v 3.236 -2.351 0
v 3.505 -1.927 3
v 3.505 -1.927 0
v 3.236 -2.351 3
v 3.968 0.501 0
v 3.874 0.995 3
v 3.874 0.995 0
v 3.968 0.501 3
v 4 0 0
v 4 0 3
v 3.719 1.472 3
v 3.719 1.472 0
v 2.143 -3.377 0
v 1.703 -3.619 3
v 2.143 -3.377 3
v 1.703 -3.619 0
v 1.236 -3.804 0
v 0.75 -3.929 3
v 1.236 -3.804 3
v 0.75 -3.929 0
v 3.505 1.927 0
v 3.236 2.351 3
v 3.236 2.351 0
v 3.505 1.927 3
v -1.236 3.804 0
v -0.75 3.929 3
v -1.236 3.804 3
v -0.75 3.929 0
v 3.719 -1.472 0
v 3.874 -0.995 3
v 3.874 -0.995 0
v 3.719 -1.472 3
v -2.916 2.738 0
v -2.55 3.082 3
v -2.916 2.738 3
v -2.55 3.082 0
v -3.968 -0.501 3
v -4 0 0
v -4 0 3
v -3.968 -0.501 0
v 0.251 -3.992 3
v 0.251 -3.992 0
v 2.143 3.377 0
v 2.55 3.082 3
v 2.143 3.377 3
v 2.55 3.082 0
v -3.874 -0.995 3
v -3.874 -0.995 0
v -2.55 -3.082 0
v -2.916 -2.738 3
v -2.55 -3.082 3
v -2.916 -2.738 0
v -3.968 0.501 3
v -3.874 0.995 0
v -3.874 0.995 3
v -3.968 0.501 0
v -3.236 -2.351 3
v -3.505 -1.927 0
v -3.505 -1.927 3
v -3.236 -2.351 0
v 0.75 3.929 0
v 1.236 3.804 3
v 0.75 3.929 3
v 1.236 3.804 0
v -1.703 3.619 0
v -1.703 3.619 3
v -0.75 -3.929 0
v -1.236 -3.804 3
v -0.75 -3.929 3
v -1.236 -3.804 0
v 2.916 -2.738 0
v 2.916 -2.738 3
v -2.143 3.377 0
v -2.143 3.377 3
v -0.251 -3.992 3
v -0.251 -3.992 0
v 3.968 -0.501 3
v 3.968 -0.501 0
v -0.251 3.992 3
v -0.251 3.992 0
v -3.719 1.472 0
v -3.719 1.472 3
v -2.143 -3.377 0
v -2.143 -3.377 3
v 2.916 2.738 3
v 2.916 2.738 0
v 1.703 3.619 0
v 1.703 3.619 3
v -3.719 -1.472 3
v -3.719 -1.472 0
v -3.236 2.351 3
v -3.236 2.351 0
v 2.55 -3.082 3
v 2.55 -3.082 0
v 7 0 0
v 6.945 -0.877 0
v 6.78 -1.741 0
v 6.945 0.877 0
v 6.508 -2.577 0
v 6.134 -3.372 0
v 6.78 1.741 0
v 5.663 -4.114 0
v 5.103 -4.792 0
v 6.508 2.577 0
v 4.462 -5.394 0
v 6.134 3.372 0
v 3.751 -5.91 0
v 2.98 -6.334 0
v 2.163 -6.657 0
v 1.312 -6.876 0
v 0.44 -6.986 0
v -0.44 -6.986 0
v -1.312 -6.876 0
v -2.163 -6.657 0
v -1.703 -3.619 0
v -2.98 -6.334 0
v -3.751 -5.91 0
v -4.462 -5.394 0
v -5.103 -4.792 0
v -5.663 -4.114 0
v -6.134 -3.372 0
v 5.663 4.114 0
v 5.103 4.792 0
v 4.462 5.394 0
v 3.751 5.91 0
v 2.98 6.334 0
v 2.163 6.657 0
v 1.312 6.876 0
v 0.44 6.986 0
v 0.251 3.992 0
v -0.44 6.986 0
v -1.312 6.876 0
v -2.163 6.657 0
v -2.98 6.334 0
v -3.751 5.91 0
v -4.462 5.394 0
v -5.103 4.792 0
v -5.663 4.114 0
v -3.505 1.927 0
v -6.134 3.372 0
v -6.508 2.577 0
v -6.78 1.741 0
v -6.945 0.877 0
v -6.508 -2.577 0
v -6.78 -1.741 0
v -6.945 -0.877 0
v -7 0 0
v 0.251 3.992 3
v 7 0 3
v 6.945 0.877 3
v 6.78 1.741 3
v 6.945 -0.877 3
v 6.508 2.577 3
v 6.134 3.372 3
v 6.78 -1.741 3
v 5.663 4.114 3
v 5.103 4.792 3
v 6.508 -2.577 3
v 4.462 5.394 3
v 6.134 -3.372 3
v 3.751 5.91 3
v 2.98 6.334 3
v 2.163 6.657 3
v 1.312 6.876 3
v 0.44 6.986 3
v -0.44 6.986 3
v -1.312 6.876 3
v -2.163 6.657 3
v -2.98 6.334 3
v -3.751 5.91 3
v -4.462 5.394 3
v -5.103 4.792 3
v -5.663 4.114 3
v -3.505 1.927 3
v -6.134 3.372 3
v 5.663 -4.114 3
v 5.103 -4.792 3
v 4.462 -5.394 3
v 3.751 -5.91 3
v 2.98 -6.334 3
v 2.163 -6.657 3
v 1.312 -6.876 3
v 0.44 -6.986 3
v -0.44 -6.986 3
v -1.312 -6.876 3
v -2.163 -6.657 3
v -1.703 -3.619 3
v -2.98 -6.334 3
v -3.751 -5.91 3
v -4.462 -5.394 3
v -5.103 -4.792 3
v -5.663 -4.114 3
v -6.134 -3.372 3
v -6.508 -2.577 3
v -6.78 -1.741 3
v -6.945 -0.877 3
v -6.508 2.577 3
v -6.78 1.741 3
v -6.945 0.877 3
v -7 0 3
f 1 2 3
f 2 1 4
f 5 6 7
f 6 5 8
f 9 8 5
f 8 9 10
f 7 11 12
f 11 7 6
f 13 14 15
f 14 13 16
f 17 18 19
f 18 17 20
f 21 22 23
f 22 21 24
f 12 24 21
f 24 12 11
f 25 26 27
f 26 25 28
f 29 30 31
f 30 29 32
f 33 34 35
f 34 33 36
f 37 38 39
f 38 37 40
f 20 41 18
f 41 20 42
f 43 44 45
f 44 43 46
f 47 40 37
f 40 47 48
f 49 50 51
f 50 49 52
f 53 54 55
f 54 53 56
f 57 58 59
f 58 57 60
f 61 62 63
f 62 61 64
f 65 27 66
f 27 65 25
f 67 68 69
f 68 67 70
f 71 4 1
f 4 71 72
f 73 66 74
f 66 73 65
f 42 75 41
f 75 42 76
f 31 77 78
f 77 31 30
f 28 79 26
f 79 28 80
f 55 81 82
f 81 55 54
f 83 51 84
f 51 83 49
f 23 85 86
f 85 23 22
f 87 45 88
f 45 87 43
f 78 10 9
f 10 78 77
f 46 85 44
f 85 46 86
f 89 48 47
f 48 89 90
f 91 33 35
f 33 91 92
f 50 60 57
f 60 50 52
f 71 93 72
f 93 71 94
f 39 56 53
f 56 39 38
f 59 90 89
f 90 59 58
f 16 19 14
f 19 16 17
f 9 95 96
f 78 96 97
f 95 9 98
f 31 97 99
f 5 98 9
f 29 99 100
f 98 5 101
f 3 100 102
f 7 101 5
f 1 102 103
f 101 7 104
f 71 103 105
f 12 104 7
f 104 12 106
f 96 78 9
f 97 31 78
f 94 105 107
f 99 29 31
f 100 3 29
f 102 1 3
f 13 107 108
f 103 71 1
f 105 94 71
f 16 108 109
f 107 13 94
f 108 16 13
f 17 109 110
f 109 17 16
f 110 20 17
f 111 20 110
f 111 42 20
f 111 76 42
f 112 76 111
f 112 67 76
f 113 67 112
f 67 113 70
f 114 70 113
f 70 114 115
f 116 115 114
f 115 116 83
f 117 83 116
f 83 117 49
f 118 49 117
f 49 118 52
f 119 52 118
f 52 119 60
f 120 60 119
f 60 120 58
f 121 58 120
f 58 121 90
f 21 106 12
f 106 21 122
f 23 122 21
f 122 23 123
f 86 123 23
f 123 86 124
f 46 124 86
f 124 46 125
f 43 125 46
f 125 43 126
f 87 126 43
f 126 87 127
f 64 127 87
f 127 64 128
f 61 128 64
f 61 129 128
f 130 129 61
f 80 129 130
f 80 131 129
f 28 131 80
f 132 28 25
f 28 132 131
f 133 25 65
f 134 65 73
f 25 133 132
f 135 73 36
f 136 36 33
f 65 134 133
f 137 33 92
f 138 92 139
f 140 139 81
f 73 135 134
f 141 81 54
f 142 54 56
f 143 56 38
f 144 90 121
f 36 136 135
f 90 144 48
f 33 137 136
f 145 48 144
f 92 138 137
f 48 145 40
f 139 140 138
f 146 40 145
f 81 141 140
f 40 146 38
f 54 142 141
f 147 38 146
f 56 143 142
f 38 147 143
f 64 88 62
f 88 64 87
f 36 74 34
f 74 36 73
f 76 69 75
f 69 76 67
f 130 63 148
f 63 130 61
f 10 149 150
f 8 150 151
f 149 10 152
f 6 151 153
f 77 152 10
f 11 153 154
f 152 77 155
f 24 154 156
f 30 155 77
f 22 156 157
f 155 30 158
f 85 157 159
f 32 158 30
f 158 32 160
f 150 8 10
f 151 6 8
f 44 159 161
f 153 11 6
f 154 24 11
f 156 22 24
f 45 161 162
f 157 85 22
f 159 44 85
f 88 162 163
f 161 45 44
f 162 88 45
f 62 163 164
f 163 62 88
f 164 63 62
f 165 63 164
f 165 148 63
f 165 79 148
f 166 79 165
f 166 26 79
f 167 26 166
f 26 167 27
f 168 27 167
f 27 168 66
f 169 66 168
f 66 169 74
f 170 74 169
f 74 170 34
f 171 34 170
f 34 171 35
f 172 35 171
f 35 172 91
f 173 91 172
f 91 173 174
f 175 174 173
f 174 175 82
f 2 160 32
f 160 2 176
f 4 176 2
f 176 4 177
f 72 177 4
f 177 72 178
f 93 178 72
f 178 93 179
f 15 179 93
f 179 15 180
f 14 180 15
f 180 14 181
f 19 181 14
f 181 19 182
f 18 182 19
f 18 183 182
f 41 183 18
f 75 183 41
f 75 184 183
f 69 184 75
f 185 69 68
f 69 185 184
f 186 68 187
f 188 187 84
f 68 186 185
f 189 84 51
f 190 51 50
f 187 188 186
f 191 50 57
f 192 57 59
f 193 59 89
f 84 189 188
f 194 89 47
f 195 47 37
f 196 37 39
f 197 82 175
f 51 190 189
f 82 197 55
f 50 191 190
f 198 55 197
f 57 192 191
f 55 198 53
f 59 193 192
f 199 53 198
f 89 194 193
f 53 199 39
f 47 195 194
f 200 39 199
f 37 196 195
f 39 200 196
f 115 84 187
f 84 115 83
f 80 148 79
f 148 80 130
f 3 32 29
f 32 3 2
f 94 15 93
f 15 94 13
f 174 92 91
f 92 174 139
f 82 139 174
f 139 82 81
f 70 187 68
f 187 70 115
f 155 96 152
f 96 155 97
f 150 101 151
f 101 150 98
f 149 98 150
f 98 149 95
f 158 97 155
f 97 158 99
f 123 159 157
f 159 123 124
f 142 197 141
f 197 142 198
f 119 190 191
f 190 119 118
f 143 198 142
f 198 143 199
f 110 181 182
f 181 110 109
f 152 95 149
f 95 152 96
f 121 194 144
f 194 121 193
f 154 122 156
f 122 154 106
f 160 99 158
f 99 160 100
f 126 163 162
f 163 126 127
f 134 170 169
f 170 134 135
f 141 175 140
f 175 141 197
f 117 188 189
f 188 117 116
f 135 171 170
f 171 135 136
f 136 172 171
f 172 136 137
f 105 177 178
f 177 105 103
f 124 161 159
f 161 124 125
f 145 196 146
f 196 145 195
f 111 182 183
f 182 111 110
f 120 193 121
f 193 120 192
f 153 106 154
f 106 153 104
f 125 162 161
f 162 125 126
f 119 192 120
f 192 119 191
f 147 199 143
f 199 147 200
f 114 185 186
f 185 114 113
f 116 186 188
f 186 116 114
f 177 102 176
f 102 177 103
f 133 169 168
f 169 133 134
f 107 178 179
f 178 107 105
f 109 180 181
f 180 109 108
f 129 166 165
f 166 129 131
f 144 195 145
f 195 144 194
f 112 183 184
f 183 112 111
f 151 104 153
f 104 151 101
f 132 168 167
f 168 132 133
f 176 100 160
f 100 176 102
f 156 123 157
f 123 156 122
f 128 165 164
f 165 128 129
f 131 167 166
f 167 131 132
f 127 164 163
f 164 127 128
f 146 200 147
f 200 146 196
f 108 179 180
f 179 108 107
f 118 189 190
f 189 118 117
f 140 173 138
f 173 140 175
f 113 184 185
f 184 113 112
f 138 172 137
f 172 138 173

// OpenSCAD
$fn = 50;


difference() {
	union() {
		cylinder(h = 3, r = 7.0000000000);
	}
	union() {
		#translate(v = [0.0000000000, 0.0000000000, -100.0000000000]) {
			cylinder(h = 200, r = 3.2500000000);
		}
		#translate(v = [0.0000000000, 0.0000000000, -100.0000000000]) {
			cylinder(h = 200, r = 3.2500000000);
		}
		#translate(v = [0.0000000000, 0.0000000000, -100.0000000000]) {
			cylinder(h = 200, r = 3.2500000000);
		}
		#translate(v = [0.0000000000, 0.0000000000, -100.0000000000]) {
			cylinder(h = 200, r = 3.2500000000);
		}
		#cylinder(h = 3, r = 4.0000000000);
	}
}
